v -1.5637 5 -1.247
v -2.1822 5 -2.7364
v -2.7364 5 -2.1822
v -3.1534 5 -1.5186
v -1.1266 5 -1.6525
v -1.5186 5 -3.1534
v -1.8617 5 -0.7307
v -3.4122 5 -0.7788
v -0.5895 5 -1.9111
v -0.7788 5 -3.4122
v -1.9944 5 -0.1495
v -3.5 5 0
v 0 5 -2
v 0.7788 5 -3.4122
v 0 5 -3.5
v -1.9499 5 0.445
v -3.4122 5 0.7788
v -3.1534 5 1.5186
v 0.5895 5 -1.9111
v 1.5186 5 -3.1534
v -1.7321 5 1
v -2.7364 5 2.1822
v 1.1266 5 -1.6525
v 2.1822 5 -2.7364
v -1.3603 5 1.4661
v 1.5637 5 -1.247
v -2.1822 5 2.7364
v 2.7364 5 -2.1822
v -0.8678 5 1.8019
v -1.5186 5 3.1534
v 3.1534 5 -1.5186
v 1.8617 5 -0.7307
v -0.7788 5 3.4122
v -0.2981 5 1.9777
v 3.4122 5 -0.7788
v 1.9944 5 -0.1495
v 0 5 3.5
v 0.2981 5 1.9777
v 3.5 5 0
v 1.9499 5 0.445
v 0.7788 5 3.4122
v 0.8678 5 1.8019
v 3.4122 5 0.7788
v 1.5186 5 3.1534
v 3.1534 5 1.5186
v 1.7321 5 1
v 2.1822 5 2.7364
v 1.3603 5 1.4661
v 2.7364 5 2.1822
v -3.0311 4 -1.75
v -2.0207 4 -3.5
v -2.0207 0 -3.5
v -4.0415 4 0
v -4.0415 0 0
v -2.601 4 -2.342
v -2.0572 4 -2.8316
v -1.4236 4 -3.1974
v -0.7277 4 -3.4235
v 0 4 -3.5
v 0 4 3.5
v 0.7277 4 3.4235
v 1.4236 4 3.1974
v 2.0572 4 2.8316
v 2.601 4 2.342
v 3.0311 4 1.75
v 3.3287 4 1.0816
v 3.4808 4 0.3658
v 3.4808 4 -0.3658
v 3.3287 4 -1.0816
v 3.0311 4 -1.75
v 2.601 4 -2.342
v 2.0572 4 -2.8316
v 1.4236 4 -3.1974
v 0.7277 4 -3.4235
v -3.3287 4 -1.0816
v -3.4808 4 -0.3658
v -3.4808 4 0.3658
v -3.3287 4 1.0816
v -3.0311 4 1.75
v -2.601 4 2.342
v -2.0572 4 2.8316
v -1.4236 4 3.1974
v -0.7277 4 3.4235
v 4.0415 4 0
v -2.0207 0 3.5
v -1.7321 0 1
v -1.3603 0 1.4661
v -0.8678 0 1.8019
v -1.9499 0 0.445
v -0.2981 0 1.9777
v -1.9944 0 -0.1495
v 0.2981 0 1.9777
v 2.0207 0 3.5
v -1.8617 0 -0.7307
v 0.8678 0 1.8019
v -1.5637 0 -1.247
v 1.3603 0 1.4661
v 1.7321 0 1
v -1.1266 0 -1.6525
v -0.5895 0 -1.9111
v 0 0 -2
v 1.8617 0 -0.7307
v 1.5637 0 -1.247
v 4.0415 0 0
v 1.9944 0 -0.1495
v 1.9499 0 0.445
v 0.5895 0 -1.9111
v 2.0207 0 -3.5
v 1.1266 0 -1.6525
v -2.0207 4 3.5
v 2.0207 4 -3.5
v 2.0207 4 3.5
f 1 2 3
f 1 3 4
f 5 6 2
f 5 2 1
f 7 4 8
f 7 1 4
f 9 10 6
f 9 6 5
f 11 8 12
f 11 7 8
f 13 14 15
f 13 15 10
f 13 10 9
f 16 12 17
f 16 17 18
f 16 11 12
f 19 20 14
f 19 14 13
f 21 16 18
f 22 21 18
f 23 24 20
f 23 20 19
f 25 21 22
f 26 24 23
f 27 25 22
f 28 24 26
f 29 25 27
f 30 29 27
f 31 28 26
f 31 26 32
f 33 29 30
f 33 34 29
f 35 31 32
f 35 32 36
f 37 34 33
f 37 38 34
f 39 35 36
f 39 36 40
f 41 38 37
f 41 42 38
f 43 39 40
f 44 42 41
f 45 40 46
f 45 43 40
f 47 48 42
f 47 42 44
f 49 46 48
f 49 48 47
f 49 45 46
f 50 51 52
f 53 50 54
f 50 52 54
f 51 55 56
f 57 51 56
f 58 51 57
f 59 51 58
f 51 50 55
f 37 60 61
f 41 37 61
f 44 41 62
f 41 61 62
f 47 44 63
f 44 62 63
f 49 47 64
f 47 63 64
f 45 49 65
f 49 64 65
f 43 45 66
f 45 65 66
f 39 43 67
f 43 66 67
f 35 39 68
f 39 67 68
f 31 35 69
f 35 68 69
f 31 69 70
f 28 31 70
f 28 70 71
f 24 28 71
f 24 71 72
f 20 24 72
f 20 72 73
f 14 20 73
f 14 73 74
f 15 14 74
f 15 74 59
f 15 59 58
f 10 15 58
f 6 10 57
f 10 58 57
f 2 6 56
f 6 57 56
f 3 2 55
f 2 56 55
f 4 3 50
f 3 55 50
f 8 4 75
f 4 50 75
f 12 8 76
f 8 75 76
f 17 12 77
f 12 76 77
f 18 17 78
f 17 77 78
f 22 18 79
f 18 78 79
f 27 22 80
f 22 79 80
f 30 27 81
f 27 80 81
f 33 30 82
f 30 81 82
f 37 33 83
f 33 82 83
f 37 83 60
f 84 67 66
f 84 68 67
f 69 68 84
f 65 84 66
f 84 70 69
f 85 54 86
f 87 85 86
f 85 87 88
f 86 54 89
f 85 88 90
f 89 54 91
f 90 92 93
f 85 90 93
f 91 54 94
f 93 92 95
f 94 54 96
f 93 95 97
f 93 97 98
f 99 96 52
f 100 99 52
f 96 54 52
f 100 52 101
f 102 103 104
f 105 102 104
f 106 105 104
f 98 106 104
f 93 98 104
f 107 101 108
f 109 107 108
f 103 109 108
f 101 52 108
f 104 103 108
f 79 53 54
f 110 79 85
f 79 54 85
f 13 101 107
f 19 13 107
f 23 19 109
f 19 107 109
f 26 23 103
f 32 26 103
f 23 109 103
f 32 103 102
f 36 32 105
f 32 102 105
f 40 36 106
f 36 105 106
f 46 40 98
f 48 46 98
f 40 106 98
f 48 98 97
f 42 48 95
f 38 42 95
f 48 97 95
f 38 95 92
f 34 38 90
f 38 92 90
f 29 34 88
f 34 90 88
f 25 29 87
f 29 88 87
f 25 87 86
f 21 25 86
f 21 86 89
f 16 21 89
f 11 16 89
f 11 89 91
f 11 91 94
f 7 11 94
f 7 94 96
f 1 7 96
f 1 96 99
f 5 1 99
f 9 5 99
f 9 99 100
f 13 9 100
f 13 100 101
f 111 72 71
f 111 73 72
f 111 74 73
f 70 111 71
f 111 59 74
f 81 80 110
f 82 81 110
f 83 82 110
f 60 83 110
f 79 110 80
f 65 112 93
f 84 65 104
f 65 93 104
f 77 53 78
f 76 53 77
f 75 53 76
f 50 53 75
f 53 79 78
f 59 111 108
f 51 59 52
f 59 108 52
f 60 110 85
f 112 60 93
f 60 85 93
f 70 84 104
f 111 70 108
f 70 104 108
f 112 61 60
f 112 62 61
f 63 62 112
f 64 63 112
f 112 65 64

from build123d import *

# Parameters (mm, degrees)
EXTRUDE_1_DEPTH     = 4
SKETCH_2_R          = 3.5
EXTRUDE_2_DEPTH     = 1
SKETCH_3_R          = 2
CUT_EXTRUDE_1_DEPTH = 8.320063752


with BuildPart() as part:
    # 草图1 → 凸台-拉伸1 (new body)
    with BuildSketch(Plane(origin=(0, 0, 0), x_dir=(1, 0, 0), z_dir=(0, 1, 0))):
        Polygon((4.041451884, 0), (2.020725942, 3.5), (-2.020725942, 3.5), (-4.041451884, 0), (-2.020725942, -3.5), (2.020725942, -3.5), align=None)
    extrude(amount=EXTRUDE_1_DEPTH)

    # 草图2 → 凸台-拉伸2 (add)
    with BuildSketch(Plane(origin=(0, 4, 0), x_dir=(1, 0, 0), z_dir=(0, 1, 0))):
        Circle(SKETCH_2_R)
    extrude(amount=EXTRUDE_2_DEPTH)

    # 草图3 → 切除-拉伸1 (cut, through all)
    with BuildSketch(Plane.XZ):
        Circle(SKETCH_3_R)
    extrude(amount=-CUT_EXTRUDE_1_DEPTH, mode=Mode.SUBTRACT)


solid = part.part
